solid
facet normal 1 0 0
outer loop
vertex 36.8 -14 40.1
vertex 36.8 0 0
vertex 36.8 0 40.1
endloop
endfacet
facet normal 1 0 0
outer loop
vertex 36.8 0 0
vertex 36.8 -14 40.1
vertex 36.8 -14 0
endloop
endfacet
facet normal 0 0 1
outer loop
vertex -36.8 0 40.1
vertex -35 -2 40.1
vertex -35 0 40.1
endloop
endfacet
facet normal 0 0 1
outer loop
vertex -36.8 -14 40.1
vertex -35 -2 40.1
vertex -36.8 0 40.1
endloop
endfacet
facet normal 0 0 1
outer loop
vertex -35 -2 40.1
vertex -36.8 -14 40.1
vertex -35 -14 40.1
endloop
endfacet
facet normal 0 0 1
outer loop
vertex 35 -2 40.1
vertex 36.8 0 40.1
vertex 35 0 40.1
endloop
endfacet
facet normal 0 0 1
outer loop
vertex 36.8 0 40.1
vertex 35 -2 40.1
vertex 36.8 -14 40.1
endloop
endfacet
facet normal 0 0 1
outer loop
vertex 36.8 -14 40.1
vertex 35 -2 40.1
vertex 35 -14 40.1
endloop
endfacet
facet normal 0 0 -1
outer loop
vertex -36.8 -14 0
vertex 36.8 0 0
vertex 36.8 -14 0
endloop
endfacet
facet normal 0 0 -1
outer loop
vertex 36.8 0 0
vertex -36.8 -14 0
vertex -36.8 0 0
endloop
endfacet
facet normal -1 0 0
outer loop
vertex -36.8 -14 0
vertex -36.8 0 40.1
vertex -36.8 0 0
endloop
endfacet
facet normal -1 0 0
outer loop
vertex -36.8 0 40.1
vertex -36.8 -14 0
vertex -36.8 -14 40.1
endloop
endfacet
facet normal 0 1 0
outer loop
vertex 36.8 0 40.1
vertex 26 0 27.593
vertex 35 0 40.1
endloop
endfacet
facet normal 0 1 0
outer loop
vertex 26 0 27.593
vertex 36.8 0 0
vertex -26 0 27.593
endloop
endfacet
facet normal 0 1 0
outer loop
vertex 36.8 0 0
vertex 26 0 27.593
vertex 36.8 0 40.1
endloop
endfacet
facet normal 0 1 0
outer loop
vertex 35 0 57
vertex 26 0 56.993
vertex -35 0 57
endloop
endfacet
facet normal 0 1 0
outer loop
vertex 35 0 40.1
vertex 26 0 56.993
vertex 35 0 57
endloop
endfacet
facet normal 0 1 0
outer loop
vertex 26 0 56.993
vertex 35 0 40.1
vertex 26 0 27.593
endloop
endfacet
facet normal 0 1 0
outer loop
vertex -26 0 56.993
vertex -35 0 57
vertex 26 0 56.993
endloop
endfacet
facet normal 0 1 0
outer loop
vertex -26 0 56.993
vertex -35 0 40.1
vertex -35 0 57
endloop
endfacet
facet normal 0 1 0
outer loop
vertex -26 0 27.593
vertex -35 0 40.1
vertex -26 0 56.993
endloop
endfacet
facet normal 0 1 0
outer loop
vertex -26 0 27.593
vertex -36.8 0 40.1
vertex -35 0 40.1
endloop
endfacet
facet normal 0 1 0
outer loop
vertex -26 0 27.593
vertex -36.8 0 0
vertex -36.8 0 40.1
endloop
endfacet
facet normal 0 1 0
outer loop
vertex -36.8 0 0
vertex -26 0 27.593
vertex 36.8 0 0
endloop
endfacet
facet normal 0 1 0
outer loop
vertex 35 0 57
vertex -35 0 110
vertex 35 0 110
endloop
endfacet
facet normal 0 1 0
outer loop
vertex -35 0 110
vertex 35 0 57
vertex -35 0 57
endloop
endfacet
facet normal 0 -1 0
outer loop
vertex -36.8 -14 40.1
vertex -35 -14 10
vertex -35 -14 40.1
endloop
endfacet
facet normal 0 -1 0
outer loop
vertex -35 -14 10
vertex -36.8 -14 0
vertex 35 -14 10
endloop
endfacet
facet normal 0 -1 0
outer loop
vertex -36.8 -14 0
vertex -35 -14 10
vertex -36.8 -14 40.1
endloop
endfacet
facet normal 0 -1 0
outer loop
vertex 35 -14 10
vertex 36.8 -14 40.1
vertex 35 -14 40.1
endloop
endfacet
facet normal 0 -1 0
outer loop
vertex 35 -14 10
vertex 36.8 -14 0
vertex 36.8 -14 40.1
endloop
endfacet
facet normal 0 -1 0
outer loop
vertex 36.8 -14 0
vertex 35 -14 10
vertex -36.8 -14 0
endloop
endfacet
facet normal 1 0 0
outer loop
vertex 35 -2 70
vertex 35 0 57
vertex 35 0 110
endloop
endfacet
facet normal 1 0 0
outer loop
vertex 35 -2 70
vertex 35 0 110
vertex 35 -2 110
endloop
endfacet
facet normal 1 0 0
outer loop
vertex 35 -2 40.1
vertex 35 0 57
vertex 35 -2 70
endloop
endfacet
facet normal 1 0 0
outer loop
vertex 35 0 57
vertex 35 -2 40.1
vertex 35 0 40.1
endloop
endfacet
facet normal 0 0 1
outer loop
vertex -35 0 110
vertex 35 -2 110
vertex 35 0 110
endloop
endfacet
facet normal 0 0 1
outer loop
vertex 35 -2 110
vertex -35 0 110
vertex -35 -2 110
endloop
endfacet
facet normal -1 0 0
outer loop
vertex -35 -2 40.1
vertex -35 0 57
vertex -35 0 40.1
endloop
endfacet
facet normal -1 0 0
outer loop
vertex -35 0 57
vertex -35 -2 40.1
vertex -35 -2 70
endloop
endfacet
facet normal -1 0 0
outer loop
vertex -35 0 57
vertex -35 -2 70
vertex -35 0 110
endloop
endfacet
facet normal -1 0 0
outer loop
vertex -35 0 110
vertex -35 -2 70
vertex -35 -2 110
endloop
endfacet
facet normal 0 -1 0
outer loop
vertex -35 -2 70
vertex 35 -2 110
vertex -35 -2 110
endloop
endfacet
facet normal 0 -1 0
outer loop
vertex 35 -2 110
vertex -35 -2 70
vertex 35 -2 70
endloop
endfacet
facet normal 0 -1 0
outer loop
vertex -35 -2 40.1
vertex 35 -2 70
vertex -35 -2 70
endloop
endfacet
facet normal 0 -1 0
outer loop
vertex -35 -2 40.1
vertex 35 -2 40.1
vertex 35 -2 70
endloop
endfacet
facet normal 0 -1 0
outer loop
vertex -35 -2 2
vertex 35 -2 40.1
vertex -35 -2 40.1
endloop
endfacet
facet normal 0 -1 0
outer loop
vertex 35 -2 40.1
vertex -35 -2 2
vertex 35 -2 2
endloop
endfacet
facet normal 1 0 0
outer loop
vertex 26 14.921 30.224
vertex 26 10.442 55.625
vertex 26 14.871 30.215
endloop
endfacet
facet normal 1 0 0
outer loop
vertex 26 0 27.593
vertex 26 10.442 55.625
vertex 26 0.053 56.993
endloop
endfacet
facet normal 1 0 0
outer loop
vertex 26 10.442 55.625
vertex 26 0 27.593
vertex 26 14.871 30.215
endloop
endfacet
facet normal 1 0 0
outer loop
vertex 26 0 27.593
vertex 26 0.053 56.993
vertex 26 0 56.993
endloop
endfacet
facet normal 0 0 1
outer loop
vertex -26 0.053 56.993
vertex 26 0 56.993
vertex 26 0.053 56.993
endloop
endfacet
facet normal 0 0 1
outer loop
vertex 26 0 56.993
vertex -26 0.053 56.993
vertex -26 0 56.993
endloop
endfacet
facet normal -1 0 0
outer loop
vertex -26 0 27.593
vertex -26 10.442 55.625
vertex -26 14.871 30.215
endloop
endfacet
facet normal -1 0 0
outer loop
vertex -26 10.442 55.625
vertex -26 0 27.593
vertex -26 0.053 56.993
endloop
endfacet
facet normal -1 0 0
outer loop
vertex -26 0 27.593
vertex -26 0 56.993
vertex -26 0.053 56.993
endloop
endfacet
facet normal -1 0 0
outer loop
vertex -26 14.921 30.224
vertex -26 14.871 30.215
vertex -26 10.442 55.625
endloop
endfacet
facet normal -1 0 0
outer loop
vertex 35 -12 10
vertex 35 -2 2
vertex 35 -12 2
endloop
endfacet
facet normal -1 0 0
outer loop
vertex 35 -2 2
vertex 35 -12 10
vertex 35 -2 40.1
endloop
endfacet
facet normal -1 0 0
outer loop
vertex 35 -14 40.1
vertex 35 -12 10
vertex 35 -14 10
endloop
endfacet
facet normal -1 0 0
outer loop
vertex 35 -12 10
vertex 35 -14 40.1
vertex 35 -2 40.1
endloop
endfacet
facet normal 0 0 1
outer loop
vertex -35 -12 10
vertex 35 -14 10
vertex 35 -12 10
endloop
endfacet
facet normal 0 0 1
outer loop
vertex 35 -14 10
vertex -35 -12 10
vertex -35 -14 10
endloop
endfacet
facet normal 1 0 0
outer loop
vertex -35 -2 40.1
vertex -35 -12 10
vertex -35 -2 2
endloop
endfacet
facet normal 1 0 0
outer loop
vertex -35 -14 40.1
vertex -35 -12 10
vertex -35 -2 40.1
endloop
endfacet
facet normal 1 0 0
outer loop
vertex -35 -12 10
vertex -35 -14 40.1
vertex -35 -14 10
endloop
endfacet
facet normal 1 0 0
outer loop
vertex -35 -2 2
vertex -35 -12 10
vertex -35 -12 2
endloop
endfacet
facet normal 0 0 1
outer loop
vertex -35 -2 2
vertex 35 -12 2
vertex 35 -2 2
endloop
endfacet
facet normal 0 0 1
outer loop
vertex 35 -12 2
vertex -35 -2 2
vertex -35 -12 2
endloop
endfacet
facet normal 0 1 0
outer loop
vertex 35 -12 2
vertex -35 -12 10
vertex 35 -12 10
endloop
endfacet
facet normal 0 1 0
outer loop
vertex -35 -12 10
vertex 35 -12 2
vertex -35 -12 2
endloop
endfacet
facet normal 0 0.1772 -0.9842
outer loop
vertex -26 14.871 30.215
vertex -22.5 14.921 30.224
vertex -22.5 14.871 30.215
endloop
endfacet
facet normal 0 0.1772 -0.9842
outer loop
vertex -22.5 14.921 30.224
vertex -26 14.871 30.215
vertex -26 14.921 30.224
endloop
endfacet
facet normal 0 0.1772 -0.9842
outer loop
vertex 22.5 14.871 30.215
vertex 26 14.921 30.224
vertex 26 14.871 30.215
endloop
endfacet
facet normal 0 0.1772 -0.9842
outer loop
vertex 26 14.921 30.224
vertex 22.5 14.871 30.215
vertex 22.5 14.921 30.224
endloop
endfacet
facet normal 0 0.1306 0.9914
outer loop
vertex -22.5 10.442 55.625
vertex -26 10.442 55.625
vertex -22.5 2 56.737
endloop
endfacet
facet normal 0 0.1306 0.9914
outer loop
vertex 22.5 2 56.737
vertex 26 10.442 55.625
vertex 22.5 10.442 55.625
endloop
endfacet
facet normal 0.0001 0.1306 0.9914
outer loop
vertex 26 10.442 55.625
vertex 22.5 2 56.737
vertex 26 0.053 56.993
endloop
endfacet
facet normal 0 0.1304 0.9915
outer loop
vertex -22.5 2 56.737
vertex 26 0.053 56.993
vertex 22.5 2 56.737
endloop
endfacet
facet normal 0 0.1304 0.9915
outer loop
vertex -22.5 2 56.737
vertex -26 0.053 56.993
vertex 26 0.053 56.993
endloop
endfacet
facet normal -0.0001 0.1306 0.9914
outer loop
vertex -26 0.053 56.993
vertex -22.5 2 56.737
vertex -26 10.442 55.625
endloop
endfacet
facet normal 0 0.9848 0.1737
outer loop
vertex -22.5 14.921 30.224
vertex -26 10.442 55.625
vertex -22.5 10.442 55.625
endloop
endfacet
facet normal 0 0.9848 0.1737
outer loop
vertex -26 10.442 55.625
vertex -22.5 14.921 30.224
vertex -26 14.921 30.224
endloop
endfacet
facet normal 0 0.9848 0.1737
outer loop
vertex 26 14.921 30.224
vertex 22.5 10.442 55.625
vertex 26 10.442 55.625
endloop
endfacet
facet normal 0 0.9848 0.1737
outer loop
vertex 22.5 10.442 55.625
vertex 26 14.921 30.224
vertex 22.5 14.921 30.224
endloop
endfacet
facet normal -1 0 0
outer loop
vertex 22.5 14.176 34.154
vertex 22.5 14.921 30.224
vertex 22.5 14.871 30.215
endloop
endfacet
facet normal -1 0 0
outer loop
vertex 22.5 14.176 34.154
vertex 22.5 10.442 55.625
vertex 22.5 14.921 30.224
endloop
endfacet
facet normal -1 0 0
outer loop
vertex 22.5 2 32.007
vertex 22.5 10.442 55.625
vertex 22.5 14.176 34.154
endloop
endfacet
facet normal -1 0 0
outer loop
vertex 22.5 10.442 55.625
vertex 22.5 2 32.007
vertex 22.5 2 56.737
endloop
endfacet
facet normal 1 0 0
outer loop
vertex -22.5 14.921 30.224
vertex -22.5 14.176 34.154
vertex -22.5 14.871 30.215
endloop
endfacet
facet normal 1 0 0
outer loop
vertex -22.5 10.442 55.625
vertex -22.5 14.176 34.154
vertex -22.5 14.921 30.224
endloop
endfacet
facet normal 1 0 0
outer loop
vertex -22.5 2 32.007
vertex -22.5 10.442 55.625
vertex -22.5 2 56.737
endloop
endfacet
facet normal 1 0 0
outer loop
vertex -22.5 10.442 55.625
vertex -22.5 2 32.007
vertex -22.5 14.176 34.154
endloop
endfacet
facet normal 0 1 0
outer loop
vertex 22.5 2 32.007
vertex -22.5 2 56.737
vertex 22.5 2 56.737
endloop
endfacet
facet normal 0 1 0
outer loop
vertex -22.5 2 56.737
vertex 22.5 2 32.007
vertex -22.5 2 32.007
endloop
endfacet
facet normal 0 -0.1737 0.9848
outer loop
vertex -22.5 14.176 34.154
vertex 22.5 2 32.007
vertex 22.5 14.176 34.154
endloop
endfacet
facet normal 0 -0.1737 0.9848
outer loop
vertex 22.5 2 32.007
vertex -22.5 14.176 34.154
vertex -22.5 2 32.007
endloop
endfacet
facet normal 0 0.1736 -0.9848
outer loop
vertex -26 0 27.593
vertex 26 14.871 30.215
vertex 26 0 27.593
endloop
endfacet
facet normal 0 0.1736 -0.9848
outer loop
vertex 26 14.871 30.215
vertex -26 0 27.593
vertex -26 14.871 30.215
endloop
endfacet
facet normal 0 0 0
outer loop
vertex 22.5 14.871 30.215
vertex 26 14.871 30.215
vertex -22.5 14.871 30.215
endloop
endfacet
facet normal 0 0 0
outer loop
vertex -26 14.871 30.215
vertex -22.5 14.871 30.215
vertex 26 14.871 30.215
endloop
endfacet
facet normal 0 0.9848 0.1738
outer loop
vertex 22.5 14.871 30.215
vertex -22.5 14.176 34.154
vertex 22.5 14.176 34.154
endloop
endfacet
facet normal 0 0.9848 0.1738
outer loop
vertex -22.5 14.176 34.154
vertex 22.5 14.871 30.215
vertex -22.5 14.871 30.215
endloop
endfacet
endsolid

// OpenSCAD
mainbox = [73.6,14,40.1];
inbox = [70, 38, 60];
sides = [70,2,110];
backbox = [52,15,29.4];

union(){
    difference(){
        union(){
            translate([-mainbox[0]/2,-mainbox[1],0])
            cube(mainbox);
            
            translate([-sides[0]/2,-sides[1],0])
            cube(sides);
            
            translate([-backbox[0]/2,0,27.593])
            cube(backbox);
        }
    union(){
        translate([-inbox[0]/2,-inbox[1]-2,10])
        cube([inbox[0],inbox[1],inbox[2]]);
        
        translate([-inbox[0]/2,-(mainbox[1]-4)-2,2])
        cube([inbox[0],mainbox[1]-4,inbox[2]]);
        };
        
        translate([-50,1.7365,17.745])
        rotate([10,0,0])
        cube([100,30,10]);
        
        translate([-50,0,57])
        rotate([-7.5,0,0])
        cube([100,30,10]);
        
        translate([-50,10.2,57])
        rotate([-80,0,0])
        cube([100,30,10]);
        
        translate([-22.5,2,0])
        cube([45,20,100]);
    }
    
    translate([-backbox[0]/2,0,27.593])
    rotate([10,0,0])
    cube([backbox[0],15.1,4]);
}
